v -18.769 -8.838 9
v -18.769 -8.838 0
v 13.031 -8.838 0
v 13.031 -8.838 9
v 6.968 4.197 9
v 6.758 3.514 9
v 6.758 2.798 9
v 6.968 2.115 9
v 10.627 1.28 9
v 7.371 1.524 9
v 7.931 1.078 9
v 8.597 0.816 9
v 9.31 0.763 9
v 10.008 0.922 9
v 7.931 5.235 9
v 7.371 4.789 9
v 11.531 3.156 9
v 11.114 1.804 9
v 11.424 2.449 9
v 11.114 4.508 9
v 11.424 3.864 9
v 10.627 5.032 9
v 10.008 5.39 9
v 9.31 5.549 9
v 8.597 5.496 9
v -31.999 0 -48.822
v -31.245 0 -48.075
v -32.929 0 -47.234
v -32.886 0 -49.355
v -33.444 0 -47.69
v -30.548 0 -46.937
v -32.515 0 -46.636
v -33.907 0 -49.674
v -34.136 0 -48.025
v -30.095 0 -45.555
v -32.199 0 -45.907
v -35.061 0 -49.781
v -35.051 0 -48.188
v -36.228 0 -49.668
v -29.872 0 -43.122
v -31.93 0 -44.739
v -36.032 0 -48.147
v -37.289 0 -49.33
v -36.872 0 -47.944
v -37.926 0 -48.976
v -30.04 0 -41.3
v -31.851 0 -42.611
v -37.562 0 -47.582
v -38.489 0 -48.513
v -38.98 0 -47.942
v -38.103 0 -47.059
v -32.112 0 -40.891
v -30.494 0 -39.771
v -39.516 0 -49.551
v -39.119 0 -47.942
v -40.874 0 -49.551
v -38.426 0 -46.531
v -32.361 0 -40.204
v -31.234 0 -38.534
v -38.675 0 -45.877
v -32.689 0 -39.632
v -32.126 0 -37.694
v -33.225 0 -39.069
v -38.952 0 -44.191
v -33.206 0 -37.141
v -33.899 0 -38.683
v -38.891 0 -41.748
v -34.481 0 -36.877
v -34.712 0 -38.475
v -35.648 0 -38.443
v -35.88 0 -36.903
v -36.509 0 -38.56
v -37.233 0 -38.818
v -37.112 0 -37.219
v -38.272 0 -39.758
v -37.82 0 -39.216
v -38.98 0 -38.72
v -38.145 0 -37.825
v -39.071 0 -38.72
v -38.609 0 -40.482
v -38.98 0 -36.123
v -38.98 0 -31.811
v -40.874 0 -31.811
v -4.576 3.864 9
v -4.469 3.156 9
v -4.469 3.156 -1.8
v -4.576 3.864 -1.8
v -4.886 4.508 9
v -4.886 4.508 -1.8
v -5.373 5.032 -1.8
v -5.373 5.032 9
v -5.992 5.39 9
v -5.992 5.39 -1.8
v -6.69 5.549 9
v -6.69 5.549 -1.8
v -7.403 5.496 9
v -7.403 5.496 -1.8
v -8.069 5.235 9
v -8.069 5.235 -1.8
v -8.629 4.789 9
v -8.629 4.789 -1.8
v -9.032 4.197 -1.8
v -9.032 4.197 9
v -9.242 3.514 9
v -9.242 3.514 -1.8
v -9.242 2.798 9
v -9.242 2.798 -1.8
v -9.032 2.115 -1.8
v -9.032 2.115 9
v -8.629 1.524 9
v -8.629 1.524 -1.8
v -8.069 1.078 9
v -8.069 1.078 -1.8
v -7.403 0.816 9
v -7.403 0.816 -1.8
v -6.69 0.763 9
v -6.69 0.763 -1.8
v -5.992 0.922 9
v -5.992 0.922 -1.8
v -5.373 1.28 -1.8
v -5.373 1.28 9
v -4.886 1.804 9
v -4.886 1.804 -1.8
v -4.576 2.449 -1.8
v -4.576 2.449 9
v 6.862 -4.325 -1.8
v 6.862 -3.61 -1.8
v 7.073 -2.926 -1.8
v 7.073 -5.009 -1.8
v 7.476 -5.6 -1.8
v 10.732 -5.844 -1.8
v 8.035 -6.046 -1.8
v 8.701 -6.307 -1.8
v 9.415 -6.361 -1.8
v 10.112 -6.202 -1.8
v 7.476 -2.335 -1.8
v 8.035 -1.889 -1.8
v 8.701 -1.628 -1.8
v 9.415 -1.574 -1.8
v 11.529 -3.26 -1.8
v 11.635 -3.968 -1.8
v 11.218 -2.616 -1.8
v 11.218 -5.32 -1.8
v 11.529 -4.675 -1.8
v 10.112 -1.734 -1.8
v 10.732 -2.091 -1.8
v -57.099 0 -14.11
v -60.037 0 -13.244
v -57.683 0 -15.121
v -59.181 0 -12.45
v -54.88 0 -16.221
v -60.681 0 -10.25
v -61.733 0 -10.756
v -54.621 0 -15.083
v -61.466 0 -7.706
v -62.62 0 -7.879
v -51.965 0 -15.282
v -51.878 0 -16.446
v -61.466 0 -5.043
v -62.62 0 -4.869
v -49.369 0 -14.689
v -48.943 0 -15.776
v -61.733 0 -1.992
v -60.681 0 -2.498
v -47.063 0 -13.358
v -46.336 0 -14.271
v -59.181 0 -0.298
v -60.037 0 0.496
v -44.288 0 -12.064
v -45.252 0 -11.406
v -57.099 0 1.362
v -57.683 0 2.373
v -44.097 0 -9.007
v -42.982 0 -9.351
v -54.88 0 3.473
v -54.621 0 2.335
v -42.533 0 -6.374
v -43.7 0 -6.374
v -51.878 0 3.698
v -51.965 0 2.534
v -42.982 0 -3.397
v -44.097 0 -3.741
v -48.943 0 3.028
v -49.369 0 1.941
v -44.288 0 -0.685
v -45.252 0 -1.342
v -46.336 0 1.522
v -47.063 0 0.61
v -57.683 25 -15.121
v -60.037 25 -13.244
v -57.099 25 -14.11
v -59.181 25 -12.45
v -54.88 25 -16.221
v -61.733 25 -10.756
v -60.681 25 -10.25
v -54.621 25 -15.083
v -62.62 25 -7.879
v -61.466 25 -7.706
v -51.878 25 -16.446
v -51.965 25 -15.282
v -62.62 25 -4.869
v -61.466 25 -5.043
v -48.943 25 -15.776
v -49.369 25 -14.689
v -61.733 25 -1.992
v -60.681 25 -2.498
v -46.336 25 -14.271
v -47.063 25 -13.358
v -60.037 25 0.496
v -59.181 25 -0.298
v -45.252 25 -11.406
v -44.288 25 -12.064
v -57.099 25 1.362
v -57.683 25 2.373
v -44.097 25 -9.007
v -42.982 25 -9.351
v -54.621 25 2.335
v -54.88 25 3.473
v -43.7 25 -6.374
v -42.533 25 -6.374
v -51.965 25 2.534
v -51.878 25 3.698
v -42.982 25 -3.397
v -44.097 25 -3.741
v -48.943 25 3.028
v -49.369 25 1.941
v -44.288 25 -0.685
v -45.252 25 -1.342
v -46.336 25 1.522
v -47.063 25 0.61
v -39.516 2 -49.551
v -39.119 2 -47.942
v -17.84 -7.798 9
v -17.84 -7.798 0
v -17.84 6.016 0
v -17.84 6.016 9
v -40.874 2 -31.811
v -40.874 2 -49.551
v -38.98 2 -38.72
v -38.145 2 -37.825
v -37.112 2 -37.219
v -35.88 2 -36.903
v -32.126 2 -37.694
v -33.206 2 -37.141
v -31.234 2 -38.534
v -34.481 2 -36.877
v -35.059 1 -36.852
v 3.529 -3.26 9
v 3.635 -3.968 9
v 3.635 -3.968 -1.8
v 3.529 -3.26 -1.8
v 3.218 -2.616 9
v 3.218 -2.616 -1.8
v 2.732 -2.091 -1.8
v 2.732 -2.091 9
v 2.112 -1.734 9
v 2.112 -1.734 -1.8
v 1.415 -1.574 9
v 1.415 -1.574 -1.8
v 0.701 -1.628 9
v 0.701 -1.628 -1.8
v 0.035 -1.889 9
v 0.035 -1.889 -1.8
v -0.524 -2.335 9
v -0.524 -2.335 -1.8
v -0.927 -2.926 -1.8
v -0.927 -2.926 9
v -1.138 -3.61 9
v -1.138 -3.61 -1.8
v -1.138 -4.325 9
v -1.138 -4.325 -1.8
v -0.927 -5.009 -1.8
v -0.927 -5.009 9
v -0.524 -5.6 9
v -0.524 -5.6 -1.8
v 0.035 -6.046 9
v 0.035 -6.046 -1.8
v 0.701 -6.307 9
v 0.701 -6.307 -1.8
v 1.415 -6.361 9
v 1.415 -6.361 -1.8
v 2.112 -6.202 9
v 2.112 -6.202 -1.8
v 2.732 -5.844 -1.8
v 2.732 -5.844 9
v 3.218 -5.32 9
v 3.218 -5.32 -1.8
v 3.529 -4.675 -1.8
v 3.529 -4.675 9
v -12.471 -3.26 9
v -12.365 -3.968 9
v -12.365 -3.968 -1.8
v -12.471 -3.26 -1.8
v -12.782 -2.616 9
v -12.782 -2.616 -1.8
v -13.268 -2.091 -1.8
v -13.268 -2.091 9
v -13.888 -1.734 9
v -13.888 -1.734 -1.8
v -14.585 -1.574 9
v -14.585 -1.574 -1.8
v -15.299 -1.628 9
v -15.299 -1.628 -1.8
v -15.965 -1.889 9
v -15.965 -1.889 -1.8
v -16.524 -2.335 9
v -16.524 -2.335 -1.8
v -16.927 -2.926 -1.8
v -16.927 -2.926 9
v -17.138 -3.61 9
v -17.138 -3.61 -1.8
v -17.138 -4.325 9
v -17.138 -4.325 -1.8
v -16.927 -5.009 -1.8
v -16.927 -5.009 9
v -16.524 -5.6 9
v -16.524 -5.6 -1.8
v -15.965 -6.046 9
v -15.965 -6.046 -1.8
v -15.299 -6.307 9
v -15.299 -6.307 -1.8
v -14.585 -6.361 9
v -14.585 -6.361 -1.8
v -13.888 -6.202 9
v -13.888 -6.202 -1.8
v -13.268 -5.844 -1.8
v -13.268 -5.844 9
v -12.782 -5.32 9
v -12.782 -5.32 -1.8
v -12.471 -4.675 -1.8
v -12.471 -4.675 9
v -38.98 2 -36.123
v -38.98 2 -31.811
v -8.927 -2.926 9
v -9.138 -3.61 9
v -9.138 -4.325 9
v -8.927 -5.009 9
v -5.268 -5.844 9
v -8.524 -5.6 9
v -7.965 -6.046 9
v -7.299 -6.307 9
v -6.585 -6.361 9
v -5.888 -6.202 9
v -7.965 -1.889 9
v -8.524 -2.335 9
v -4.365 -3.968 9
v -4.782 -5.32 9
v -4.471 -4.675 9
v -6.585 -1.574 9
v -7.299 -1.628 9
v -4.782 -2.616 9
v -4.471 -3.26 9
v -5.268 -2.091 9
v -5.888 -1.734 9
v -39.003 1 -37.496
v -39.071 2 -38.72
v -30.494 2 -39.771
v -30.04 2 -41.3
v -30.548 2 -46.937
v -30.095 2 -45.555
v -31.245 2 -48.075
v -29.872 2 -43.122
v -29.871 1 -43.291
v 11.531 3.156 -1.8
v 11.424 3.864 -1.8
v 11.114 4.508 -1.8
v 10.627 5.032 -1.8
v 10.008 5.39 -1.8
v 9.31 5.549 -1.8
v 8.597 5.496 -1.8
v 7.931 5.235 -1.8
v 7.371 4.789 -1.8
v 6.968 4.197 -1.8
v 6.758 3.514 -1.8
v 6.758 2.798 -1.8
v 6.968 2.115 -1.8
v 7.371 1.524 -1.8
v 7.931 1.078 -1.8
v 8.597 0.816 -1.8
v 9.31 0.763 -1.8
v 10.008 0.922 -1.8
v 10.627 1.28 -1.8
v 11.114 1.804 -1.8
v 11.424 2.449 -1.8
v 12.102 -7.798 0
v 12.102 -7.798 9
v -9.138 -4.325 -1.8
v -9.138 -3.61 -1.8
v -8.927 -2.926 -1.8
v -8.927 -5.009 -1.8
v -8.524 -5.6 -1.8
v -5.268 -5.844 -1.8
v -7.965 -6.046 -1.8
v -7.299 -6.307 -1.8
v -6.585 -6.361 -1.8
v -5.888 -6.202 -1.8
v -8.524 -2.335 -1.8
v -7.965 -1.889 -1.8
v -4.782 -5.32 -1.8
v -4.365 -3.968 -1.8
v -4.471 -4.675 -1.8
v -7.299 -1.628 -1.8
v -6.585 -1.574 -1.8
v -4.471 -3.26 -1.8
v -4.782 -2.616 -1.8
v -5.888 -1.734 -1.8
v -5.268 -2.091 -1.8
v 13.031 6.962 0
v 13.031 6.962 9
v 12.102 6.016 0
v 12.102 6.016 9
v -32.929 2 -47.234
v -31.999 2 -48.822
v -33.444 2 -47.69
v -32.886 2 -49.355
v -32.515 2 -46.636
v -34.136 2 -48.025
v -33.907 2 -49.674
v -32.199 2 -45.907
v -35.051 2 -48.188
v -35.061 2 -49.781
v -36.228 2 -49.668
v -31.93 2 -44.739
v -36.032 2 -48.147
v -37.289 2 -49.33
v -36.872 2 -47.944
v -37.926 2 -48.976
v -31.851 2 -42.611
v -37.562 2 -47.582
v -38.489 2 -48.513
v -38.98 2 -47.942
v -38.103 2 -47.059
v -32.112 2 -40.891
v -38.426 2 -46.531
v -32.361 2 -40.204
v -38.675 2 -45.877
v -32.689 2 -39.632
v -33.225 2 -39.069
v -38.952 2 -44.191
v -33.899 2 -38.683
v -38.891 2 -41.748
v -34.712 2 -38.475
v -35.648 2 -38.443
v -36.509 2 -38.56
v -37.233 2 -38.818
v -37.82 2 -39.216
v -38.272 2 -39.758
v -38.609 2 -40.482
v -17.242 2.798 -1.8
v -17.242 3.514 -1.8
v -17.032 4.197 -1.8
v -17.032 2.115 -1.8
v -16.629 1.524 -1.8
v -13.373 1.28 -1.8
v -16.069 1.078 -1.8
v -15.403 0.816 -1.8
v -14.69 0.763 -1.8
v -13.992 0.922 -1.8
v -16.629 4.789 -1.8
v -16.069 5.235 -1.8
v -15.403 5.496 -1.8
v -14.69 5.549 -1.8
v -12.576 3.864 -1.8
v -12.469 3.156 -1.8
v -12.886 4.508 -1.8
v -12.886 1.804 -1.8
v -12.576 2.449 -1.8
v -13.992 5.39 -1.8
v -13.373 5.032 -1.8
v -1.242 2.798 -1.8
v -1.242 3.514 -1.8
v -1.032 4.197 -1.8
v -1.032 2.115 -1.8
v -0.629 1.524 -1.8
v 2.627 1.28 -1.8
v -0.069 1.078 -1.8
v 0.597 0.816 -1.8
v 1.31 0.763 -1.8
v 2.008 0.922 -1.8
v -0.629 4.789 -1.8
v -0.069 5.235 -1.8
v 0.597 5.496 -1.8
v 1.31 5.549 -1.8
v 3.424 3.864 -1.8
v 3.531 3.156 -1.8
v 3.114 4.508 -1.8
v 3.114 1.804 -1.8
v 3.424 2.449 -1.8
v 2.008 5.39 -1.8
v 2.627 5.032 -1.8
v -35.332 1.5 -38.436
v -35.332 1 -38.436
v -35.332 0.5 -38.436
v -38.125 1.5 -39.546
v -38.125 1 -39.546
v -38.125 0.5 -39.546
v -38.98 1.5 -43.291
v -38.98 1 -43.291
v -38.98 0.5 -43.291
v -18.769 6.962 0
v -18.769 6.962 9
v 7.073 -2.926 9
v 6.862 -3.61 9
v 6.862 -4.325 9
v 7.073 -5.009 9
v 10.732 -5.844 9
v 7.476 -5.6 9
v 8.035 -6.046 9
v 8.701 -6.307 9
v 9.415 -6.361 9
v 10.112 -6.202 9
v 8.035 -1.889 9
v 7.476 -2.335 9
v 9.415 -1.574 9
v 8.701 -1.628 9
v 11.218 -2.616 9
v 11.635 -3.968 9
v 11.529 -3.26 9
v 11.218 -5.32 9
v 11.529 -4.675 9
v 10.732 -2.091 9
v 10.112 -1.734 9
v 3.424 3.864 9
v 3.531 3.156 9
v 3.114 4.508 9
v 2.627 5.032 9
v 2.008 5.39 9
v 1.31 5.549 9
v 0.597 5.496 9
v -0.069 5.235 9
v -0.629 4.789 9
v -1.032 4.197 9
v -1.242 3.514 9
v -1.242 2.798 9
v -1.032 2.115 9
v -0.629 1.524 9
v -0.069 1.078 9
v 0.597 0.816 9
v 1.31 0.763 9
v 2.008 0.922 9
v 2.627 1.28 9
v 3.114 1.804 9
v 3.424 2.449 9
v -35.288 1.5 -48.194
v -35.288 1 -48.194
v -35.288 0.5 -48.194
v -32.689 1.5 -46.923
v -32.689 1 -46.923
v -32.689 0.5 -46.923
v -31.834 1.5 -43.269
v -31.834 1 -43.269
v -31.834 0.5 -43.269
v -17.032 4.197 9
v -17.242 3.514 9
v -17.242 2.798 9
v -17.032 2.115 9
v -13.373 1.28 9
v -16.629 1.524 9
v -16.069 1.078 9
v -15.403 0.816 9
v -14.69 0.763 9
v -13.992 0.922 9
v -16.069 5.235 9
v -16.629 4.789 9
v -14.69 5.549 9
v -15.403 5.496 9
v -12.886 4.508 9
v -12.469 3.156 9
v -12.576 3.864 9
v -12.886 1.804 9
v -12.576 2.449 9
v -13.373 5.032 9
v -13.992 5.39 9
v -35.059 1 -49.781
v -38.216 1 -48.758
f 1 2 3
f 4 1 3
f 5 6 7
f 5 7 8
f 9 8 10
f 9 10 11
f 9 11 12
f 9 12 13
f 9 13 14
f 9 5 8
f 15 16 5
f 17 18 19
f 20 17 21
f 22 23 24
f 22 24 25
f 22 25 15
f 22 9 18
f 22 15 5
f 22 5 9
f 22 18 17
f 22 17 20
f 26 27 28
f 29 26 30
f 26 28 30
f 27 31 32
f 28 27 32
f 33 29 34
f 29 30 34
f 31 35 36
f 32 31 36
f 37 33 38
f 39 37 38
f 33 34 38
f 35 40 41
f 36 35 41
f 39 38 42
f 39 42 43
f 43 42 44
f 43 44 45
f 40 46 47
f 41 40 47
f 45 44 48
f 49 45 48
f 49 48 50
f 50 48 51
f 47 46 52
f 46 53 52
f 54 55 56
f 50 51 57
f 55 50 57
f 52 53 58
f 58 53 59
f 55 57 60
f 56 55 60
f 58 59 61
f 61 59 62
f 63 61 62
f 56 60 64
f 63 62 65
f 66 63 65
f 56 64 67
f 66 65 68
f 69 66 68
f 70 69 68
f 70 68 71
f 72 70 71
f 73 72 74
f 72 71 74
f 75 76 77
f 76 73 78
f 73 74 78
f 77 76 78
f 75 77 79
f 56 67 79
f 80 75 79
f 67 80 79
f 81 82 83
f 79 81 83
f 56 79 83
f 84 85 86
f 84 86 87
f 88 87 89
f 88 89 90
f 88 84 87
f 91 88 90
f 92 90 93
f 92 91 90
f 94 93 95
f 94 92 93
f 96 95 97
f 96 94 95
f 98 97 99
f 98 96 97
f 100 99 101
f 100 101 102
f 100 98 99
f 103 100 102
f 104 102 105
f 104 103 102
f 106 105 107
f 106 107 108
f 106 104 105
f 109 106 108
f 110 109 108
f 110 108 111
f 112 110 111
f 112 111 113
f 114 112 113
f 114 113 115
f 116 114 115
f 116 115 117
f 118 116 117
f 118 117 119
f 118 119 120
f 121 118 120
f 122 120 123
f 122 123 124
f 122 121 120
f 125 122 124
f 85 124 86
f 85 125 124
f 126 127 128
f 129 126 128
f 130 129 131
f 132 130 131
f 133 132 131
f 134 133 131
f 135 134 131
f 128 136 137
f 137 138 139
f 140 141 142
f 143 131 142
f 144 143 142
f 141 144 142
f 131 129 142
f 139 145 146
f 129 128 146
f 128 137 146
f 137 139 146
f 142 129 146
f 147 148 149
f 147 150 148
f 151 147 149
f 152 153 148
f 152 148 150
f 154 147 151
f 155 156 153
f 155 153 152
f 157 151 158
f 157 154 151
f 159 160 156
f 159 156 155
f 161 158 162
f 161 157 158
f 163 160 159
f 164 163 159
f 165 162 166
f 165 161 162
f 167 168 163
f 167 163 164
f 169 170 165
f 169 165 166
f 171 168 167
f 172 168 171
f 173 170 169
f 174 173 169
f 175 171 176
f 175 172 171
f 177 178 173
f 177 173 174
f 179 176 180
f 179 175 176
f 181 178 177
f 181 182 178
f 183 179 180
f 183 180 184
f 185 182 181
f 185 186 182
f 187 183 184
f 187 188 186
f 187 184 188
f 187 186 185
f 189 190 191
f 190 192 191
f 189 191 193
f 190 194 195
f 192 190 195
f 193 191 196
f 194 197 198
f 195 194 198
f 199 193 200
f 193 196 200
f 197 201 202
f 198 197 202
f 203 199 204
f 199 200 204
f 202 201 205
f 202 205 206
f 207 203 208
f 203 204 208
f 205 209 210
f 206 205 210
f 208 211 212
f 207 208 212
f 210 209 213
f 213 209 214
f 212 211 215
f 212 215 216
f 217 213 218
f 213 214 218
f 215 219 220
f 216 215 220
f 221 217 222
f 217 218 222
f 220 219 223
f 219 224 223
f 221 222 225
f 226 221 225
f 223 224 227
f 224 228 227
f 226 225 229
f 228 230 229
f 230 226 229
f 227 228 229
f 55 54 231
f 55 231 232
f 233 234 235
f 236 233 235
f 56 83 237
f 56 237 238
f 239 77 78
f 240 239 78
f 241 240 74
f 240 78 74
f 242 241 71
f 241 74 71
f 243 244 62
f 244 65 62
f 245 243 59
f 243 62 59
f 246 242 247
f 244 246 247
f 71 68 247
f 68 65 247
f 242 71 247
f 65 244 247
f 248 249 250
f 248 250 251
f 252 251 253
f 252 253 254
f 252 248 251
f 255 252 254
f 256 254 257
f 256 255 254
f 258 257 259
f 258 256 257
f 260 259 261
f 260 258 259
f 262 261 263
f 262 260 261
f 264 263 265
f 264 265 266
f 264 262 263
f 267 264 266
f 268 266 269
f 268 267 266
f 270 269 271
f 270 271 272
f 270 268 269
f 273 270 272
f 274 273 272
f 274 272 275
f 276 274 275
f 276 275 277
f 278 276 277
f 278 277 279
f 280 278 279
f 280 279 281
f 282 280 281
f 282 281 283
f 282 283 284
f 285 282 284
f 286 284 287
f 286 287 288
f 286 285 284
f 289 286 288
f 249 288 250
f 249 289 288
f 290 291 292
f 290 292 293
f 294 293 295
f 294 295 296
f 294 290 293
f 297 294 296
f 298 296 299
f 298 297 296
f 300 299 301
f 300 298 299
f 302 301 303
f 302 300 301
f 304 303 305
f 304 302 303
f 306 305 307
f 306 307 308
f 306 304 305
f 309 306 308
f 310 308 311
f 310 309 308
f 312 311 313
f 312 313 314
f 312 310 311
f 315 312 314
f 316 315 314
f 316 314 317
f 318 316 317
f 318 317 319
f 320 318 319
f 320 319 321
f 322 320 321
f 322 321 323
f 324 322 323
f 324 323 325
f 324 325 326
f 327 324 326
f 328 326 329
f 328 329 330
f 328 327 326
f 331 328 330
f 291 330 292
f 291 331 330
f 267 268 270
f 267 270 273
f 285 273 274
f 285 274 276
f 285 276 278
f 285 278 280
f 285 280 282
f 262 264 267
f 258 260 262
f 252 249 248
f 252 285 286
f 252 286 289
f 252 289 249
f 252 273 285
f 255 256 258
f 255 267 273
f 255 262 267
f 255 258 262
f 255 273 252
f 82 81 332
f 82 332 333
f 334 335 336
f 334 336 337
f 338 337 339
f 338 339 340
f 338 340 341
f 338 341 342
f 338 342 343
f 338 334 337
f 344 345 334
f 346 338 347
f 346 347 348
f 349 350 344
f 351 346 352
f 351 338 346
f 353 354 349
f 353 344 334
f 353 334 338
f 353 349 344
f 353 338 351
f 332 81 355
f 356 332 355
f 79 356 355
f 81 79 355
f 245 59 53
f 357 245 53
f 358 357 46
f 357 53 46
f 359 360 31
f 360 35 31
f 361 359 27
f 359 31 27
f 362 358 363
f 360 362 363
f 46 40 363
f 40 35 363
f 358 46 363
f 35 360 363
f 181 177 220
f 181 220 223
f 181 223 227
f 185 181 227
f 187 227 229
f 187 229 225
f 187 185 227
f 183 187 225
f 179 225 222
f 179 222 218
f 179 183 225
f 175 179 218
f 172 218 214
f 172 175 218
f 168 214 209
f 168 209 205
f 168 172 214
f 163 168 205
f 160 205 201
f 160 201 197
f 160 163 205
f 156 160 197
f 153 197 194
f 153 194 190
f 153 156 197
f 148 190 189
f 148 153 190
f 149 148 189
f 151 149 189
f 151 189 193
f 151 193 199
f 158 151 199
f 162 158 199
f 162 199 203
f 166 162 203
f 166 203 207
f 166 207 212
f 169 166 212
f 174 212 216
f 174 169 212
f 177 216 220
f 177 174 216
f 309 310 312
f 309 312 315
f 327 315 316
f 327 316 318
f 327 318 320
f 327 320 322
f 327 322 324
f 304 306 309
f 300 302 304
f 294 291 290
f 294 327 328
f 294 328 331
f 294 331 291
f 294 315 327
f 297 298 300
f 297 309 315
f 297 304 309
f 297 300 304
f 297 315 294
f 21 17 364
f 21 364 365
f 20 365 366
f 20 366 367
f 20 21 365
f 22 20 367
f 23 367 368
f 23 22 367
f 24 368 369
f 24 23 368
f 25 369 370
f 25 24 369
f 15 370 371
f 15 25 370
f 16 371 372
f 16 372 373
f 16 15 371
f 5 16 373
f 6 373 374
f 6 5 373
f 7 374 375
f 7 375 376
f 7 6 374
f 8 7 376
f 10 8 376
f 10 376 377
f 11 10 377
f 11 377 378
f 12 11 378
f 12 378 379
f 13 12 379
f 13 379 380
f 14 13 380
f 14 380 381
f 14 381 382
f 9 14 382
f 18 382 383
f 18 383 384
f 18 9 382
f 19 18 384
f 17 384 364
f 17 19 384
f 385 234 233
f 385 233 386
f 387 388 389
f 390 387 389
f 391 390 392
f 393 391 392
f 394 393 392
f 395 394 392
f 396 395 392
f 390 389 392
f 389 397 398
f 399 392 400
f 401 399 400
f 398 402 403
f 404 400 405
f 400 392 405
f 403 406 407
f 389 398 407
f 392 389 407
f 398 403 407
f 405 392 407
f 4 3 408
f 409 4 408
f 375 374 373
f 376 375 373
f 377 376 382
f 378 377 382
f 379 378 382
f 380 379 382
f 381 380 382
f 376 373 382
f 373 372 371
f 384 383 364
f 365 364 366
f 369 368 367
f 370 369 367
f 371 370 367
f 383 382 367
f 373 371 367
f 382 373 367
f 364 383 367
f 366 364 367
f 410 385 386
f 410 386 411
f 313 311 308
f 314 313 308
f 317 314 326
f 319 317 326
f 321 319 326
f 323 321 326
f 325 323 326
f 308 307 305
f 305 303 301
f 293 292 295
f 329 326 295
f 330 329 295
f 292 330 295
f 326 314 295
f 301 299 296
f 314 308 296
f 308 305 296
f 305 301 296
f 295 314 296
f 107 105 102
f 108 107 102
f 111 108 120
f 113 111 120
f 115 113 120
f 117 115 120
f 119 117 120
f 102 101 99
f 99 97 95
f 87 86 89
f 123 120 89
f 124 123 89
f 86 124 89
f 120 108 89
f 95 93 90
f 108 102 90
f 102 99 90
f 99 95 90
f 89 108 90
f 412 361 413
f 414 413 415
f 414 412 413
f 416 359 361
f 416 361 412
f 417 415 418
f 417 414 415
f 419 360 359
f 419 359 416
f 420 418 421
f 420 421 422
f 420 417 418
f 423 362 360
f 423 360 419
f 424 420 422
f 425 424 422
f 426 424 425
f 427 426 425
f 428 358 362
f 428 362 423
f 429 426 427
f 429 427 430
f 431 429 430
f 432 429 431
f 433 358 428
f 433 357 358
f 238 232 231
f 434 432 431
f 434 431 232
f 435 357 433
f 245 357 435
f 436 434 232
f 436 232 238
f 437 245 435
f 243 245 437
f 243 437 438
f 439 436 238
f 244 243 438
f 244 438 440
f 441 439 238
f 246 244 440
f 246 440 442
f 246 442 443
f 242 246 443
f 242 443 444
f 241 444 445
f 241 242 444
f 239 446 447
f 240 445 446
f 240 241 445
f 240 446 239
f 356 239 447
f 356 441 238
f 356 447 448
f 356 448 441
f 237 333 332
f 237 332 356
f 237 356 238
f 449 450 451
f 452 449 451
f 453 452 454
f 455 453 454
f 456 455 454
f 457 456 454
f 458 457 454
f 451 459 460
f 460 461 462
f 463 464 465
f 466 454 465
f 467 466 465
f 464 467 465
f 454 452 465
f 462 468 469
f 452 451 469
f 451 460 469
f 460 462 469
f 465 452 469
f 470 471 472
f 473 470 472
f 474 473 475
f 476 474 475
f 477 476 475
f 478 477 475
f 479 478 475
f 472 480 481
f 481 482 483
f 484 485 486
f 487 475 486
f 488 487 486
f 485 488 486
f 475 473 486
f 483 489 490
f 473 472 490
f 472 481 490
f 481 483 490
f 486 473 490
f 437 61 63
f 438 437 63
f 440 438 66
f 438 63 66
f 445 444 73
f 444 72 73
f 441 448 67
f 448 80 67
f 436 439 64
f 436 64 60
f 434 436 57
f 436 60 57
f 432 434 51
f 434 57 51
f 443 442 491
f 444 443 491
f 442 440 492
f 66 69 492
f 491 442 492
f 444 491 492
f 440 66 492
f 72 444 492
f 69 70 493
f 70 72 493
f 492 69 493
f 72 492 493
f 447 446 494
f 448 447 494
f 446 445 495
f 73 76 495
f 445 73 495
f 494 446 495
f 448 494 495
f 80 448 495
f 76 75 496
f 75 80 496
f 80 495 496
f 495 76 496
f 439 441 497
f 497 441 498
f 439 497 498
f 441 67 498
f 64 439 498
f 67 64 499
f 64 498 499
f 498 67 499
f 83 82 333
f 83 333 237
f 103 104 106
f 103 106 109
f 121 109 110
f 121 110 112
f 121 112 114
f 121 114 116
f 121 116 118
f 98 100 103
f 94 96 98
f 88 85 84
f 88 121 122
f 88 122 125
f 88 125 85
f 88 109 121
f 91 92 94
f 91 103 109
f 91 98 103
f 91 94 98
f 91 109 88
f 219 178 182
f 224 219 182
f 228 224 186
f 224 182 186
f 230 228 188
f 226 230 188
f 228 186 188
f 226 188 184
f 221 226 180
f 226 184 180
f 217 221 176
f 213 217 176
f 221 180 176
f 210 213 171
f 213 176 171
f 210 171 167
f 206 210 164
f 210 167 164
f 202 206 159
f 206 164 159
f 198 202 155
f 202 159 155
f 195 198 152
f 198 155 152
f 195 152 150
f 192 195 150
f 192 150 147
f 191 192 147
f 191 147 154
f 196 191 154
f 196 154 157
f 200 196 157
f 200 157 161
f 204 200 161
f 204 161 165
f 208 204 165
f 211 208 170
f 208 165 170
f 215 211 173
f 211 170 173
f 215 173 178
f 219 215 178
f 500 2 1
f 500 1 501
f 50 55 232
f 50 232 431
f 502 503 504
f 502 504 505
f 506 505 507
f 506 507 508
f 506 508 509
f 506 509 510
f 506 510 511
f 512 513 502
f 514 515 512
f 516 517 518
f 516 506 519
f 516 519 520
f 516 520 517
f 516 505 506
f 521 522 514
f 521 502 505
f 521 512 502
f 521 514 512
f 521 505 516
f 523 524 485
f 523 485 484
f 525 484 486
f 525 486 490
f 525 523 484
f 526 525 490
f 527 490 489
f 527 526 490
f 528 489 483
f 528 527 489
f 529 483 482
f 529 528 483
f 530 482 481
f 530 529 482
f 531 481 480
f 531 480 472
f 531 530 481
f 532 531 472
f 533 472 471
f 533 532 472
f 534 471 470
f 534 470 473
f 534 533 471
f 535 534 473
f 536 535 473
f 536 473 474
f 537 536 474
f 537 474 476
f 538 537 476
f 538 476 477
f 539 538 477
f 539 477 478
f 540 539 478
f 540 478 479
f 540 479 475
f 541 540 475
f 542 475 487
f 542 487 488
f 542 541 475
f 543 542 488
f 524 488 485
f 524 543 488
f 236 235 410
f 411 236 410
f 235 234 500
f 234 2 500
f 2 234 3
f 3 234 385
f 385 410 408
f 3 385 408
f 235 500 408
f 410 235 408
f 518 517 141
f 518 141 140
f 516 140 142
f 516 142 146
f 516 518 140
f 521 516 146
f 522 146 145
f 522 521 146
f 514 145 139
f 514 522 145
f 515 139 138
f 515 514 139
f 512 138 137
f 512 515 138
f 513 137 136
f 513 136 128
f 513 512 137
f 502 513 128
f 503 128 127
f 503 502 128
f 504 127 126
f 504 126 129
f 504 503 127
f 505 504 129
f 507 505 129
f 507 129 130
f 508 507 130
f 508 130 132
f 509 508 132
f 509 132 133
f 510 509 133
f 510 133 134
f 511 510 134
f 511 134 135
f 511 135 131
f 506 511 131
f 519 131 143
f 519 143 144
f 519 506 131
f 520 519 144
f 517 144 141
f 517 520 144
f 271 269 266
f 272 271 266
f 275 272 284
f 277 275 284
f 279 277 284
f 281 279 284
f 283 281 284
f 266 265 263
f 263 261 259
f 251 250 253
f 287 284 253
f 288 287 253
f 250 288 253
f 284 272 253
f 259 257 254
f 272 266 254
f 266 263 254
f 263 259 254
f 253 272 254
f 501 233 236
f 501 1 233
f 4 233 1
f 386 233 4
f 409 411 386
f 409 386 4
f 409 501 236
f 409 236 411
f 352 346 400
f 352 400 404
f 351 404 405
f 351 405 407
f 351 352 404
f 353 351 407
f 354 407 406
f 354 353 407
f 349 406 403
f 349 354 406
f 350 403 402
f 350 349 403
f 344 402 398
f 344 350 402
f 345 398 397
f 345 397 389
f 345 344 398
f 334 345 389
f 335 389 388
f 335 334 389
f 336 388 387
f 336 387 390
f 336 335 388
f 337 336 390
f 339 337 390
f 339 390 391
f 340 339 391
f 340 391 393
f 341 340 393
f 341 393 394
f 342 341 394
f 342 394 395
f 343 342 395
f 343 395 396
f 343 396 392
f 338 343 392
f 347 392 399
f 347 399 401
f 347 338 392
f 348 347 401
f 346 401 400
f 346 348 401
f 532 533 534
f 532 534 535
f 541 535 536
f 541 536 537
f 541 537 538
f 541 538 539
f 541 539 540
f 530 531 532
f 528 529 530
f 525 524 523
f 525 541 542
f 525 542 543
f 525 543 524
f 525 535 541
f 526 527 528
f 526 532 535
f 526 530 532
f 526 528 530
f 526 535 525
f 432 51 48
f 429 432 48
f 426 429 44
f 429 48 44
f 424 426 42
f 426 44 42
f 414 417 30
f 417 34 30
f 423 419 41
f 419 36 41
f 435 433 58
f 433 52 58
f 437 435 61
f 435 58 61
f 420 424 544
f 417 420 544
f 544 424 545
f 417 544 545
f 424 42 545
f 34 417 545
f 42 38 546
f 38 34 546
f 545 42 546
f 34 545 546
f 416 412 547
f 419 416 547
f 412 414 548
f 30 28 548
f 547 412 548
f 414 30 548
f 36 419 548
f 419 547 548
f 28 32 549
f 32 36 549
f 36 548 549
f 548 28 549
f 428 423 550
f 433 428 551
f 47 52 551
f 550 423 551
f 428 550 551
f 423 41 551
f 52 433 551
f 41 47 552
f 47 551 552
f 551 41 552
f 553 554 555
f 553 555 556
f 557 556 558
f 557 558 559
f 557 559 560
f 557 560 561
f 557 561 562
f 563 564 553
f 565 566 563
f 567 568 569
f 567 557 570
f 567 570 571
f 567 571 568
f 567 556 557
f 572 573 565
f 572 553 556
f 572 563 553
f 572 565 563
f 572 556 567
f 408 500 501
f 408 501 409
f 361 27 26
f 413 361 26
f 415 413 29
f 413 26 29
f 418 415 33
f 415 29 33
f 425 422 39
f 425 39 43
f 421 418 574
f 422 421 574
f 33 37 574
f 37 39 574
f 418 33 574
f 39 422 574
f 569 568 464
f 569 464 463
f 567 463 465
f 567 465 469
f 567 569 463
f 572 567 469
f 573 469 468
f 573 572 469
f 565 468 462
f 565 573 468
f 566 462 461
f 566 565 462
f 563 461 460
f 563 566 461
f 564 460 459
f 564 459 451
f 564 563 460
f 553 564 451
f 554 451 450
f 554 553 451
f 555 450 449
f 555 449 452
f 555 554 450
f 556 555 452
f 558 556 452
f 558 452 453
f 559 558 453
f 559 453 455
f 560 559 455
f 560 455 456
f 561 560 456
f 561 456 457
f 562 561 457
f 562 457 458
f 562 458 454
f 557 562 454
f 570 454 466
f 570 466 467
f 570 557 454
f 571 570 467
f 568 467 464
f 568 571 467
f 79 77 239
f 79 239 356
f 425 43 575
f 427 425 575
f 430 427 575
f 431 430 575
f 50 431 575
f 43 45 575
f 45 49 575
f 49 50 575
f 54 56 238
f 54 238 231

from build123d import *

# Parameters (mm, degrees)
F0_W     = 31.8
F0_H     = 15.8
F0_W_2   = 29.9425181001
F0_H_2   = 13.8138793409
F1_DEPTH = 9
F2_R     = 2.4
F3_DEPTH = 10.8
F4_R     = 10.1000236813
F4_R_2   = 8.9326569629
F5_DEPTH = 25
F6_DEPTH = 2


with BuildPart() as f1:
    # F0 (on Top) → F1 (new body)
    with BuildSketch(Plane.XY):
        with Locations((-2.869211603, -0.9375357135)):
            Rectangle(F0_W, F0_H)
        with Locations((-2.8689606115, -0.8908784948)):
            Rectangle(F0_W_2, F0_H_2, mode=Mode.SUBTRACT)
    extrude(amount=F1_DEPTH)


with BuildPart() as f3:
    # F2 (on face) → F3 (new body)
    with BuildSketch(Plane.XY.offset(9)):
        with Locations((-14.869211603, 3.1560885722)):
            Circle(F2_R)
    extrude(amount=-F3_DEPTH)


with BuildPart() as f3b:
    # F2 (on face) → F3, piece 2 (new body)
    with BuildSketch(Plane.XY.offset(9)):
        with Locations((-6.869211603, 3.1560885722)):
            Circle(F2_R)
    extrude(amount=-F3_DEPTH)


with BuildPart() as f3c:
    # F2 (on face) → F3, piece 3 (new body)
    with BuildSketch(Plane.XY.offset(9)):
        with Locations((1.130788397, 3.1560885722)):
            Circle(F2_R)
    extrude(amount=-F3_DEPTH)


with BuildPart() as f3d:
    # F2 (on face) → F3, piece 4 (new body)
    with BuildSketch(Plane.XY.offset(9)):
        with Locations((9.130788397, 3.1560885722)):
            Circle(F2_R)
    extrude(amount=-F3_DEPTH)


with BuildPart() as f3e:
    # F2 (on face) → F3, piece 5 (new body)
    with BuildSketch(Plane.XY.offset(9)):
        with Locations((-14.76457, -3.9676)):
            Circle(F2_R)
    extrude(amount=-F3_DEPTH)


with BuildPart() as f3f:
    # F2 (on face) → F3, piece 6 (new body)
    with BuildSketch(Plane.XY.offset(9)):
        with Locations((-6.76457, -3.9676)):
            Circle(F2_R)
    extrude(amount=-F3_DEPTH)


with BuildPart() as f3g:
    # F2 (on face) → F3, piece 7 (new body)
    with BuildSketch(Plane.XY.offset(9)):
        with Locations((1.23543, -3.9676)):
            Circle(F2_R)
    extrude(amount=-F3_DEPTH)


with BuildPart() as f3h:
    # F2 (on face) → F3, piece 8 (new body)
    with BuildSketch(Plane.XY.offset(9)):
        with Locations((9.23543, -3.9676)):
            Circle(F2_R)
    extrude(amount=-F3_DEPTH)


with BuildPart() as f5:
    # F4 (on Front) → F5 (new body)
    with BuildSketch(Plane.XZ):
        with Locations((-52.6328161359, -6.3741654158)):
            Circle(F4_R)
        with Locations((-52.6328161359, -6.3741654158)):
            Circle(F4_R_2, mode=Mode.SUBTRACT)
    extrude(amount=-F5_DEPTH)


with BuildPart() as f6:
    # F4 (on Front) → F6 (new body)
    with BuildSketch(Plane.XZ):
        with BuildLine():
            add(Edge.make_bspline(
                [(-35.0586663828, -36.8523016239), (-32.5962869667, -36.8523016239), (-31.2337703565, -38.5340155659)],
                knots=[0, 0, 0, 1, 1, 1], degree=2))
            add(Edge.make_bspline(
                [(-38.980233601, -38.7200620106), (-37.6596686401, -36.8523016239), (-35.0586663828, -36.8523016239)],
                knots=[0, 0, 0, 1, 1, 1], degree=2))
            Line((-38.980233601, -38.7200620106), (-39.0714328387, -38.7200620106))
            add(Edge.make_bspline(
                [(-38.980233601, -36.1227077228), (-38.980233601, -37.5709516164), (-39.0714328387, -38.7200620106)],
                knots=[0, 0, 0, 1, 1, 1], degree=2))
            Line((-38.980233601, -36.1227077228), (-38.980233601, -31.8108077675))
            Line((-38.980233601, -31.8108077675), (-40.8735297743, -31.8108077675))
            Line((-40.8735297743, -31.8108077675), (-40.8735297743, -49.550883472))
            Line((-40.8735297743, -49.550883472), (-39.5164851183, -49.550883472))
            Line((-39.5164851183, -49.550883472), (-39.1188564423, -47.9421289201))
            Line((-39.1188564423, -47.9421289201), (-38.980233601, -47.9421289201))
            add(Edge.make_bspline(
                [(-37.2893997353, -49.3301813169), (-38.2980633036, -48.879657083), (-38.980233601, -47.9421289201)],
                knots=[0, 0, 0, 1, 1, 1], degree=2))
            add(Edge.make_bspline(
                [(-35.0586663828, -49.7807055508), (-36.2807361671, -49.7807055508), (-37.2893997353, -49.3301813169)],
                knots=[0, 0, 0, 1, 1, 1], degree=2))
            add(Edge.make_bspline(
                [(-31.244714265, -48.0752798071), (-32.6181747837, -49.7807055508), (-35.0586663828, -49.7807055508)],
                knots=[0, 0, 0, 1, 1, 1], degree=2))
            add(Edge.make_bspline(
                [(-29.8712537462, -43.2909678008), (-29.8712537462, -46.3698540633), (-31.244714265, -48.0752798071)],
                knots=[0, 0, 0, 1, 1, 1], degree=2))
            add(Edge.make_bspline(
                [(-31.2337703565, -38.5340155659), (-29.8712537462, -40.2157295078), (-29.8712537462, -43.2909678008)],
                knots=[0, 0, 0, 1, 1, 1], degree=2))
        make_face()
        with BuildLine():
            add(Edge.make_bspline(
                [(-35.3322640957, -38.4355203892), (-37.269335903, -38.4355203892), (-38.124784752, -39.5463271036)],
                knots=[0, 0, 0, 1, 1, 1], degree=2))
            add(Edge.make_bspline(
                [(-32.6893101891, -39.632054387), (-33.5447590381, -38.4355203892), (-35.3322640957, -38.4355203892)],
                knots=[0, 0, 0, 1, 1, 1], degree=2))
            add(Edge.make_bspline(
                [(-31.8338613401, -43.2690799838), (-31.8338613401, -40.8285883847), (-32.6893101891, -39.632054387)],
                knots=[0, 0, 0, 1, 1, 1], degree=2))
            add(Edge.make_bspline(
                [(-32.6893101891, -46.9225214434), (-31.8338613401, -45.6512040708), (-31.8338613401, -43.2690799838)],
                knots=[0, 0, 0, 1, 1, 1], degree=2))
            add(Edge.make_bspline(
                [(-35.2884884616, -48.193838816), (-33.5447590381, -48.193838816), (-32.6893101891, -46.9225214434)],
                knots=[0, 0, 0, 1, 1, 1], degree=2))
            add(Edge.make_bspline(
                [(-38.102896935, -47.0593202998), (-37.225560269, -48.193838816), (-35.2884884616, -48.193838816)],
                knots=[0, 0, 0, 1, 1, 1], degree=2))
            add(Edge.make_bspline(
                [(-38.980233601, -43.2909678008), (-38.980233601, -45.9248017837), (-38.102896935, -47.0593202998)],
                knots=[0, 0, 0, 1, 1, 1], degree=2))
            add(Edge.make_bspline(
                [(-38.124784752, -39.5463271036), (-38.980233601, -40.657133818), (-38.980233601, -43.2909678008)],
                knots=[0, 0, 0, 1, 1, 1], degree=2))
        make_face(mode=Mode.SUBTRACT)
    extrude(amount=-F6_DEPTH)


solid = Compound([f1.part, f3.part, f3b.part, f3c.part, f3d.part, f3e.part, f3f.part, f3g.part, f3h.part, f5.part, f6.part])
